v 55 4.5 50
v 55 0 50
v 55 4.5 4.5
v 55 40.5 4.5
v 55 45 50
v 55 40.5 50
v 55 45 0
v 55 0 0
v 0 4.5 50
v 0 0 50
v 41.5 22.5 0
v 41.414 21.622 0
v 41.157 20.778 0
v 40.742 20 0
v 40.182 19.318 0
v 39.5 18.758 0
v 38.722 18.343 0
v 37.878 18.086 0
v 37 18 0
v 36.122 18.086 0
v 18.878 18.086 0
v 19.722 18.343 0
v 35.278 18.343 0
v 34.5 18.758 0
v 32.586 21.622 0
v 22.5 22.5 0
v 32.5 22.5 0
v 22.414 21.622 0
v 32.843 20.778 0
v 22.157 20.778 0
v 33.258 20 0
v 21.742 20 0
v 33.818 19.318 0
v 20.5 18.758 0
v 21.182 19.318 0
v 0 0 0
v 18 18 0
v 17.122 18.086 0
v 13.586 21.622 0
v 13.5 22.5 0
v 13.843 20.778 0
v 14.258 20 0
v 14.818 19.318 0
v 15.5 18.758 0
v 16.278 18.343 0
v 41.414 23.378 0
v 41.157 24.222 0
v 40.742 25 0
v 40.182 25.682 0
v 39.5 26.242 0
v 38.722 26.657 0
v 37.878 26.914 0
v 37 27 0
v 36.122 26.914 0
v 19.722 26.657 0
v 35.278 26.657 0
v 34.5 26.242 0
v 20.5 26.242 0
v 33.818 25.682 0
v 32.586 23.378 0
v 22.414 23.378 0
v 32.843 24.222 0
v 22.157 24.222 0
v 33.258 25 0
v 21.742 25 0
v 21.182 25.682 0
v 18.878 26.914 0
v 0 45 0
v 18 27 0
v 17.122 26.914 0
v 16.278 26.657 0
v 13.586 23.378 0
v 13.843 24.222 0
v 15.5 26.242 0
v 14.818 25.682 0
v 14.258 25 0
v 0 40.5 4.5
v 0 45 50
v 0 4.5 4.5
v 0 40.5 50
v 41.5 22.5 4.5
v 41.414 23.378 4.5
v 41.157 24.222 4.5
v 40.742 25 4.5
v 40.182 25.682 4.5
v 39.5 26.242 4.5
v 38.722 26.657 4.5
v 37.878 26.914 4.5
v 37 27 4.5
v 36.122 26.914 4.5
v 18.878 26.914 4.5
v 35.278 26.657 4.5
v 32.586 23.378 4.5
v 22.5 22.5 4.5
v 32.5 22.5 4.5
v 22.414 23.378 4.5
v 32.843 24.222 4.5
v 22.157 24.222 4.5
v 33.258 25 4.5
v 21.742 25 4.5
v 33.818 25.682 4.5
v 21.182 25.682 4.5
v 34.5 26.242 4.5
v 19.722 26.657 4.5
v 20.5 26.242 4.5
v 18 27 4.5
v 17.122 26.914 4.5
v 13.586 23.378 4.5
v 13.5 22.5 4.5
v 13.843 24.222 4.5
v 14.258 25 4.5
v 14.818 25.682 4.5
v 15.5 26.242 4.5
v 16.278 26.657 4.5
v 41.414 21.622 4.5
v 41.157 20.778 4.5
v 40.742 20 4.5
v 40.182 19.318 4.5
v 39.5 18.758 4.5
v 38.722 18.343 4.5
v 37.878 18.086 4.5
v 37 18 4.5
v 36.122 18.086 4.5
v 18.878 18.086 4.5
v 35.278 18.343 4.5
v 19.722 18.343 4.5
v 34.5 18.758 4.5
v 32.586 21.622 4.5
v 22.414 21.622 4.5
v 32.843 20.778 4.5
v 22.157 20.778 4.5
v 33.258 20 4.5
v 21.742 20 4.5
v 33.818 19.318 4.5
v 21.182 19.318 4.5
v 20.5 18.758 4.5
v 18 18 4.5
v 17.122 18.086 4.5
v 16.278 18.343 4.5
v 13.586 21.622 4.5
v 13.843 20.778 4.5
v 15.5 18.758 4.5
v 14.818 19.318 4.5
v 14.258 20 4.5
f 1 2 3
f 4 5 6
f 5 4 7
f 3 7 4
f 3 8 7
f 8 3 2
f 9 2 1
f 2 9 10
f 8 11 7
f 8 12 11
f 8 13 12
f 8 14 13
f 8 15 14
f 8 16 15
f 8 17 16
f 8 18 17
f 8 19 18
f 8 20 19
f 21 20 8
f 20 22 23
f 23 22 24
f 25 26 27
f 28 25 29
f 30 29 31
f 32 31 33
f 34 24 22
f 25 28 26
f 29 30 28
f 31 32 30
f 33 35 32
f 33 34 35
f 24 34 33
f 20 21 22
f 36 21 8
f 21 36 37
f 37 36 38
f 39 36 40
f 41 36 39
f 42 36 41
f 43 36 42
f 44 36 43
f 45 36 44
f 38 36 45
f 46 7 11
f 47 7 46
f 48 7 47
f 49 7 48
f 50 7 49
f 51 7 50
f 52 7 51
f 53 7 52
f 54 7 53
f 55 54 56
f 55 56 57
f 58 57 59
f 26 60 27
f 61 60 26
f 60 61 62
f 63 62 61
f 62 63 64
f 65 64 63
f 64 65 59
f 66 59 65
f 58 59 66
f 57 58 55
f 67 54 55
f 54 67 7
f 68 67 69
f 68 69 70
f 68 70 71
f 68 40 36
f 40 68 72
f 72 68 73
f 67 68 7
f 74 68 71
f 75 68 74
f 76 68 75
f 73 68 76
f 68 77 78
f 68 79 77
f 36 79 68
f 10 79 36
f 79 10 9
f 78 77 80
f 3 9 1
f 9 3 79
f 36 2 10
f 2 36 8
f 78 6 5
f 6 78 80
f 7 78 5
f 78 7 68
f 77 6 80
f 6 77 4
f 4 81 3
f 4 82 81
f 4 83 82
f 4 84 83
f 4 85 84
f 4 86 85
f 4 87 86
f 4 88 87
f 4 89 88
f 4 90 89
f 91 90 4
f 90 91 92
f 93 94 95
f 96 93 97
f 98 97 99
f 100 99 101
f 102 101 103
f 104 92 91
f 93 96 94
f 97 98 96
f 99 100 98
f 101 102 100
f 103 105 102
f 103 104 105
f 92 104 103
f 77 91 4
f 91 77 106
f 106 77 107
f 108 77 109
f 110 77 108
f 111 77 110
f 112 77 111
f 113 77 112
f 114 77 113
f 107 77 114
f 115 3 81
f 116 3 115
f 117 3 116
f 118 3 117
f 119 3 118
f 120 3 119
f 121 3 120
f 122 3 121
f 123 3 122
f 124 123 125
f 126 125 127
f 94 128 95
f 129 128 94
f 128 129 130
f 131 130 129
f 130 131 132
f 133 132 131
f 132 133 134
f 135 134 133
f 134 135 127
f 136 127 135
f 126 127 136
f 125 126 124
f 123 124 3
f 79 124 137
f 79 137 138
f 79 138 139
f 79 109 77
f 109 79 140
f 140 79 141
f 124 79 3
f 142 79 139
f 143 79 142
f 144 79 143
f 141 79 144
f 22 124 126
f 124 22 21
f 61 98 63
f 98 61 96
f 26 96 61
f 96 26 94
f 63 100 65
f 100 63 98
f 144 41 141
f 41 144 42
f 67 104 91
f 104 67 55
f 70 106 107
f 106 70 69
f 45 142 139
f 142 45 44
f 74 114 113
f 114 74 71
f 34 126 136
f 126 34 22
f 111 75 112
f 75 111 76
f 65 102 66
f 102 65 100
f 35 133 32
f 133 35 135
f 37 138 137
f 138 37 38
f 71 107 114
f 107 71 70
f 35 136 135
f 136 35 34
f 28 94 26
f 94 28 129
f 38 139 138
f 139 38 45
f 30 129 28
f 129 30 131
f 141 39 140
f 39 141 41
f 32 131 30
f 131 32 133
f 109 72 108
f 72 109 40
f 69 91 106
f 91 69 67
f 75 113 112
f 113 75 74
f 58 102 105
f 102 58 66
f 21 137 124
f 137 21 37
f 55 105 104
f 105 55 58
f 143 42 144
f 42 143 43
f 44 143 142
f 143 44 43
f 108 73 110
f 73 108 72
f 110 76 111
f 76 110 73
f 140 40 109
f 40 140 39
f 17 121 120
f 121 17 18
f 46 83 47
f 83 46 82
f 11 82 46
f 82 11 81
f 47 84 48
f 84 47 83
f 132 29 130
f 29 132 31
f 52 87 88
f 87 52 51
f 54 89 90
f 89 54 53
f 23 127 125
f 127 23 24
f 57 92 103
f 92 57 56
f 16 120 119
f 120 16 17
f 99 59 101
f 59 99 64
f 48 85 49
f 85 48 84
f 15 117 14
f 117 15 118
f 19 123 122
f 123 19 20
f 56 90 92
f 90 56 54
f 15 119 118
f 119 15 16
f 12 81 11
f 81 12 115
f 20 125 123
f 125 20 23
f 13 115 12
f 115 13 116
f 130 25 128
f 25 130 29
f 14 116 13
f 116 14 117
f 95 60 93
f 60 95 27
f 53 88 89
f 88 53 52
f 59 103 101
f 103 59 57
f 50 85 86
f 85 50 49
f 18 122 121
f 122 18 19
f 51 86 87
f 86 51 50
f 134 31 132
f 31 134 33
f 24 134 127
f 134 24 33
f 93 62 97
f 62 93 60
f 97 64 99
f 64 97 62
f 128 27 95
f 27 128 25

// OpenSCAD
$fn = 32;

// ----------------------------------------------------------------------
// U-bracket: 55 x 45 x 50 mm
// ----------------------------------------------------------------------

// --- parameters (mm) ---
base_len = 55;            // outer length, X
channel_w = 45;           // outer width, Y
upright_h = 50;           // upright height, Z
mat_t = 4.5;              // wall thickness
hole_d = 9;               // clearance for M8

module hole_z(px, py) {
  translate([px, py, -2.5]) cylinder(h = mat_t + 5, d = hole_d);
}
module hole_y_pz(pz) {
  /* through both uprights along Y */
  translate([0, -2.5, pz]) rotate([-90, 0, 0]) cylinder(h = channel_w + 5, d = hole_d);
}

module base() {
  cube([base_len, channel_w, mat_t]);
}

module uprights() {
  cube([base_len, mat_t, upright_h]);
  translate([0, channel_w - mat_t, 0]) cube([base_len, mat_t, upright_h]);
}

difference() {
  union() {
    base();
    uprights();
  }
  hole_z(18, 22.5);
  hole_z(37, 22.5);
}
